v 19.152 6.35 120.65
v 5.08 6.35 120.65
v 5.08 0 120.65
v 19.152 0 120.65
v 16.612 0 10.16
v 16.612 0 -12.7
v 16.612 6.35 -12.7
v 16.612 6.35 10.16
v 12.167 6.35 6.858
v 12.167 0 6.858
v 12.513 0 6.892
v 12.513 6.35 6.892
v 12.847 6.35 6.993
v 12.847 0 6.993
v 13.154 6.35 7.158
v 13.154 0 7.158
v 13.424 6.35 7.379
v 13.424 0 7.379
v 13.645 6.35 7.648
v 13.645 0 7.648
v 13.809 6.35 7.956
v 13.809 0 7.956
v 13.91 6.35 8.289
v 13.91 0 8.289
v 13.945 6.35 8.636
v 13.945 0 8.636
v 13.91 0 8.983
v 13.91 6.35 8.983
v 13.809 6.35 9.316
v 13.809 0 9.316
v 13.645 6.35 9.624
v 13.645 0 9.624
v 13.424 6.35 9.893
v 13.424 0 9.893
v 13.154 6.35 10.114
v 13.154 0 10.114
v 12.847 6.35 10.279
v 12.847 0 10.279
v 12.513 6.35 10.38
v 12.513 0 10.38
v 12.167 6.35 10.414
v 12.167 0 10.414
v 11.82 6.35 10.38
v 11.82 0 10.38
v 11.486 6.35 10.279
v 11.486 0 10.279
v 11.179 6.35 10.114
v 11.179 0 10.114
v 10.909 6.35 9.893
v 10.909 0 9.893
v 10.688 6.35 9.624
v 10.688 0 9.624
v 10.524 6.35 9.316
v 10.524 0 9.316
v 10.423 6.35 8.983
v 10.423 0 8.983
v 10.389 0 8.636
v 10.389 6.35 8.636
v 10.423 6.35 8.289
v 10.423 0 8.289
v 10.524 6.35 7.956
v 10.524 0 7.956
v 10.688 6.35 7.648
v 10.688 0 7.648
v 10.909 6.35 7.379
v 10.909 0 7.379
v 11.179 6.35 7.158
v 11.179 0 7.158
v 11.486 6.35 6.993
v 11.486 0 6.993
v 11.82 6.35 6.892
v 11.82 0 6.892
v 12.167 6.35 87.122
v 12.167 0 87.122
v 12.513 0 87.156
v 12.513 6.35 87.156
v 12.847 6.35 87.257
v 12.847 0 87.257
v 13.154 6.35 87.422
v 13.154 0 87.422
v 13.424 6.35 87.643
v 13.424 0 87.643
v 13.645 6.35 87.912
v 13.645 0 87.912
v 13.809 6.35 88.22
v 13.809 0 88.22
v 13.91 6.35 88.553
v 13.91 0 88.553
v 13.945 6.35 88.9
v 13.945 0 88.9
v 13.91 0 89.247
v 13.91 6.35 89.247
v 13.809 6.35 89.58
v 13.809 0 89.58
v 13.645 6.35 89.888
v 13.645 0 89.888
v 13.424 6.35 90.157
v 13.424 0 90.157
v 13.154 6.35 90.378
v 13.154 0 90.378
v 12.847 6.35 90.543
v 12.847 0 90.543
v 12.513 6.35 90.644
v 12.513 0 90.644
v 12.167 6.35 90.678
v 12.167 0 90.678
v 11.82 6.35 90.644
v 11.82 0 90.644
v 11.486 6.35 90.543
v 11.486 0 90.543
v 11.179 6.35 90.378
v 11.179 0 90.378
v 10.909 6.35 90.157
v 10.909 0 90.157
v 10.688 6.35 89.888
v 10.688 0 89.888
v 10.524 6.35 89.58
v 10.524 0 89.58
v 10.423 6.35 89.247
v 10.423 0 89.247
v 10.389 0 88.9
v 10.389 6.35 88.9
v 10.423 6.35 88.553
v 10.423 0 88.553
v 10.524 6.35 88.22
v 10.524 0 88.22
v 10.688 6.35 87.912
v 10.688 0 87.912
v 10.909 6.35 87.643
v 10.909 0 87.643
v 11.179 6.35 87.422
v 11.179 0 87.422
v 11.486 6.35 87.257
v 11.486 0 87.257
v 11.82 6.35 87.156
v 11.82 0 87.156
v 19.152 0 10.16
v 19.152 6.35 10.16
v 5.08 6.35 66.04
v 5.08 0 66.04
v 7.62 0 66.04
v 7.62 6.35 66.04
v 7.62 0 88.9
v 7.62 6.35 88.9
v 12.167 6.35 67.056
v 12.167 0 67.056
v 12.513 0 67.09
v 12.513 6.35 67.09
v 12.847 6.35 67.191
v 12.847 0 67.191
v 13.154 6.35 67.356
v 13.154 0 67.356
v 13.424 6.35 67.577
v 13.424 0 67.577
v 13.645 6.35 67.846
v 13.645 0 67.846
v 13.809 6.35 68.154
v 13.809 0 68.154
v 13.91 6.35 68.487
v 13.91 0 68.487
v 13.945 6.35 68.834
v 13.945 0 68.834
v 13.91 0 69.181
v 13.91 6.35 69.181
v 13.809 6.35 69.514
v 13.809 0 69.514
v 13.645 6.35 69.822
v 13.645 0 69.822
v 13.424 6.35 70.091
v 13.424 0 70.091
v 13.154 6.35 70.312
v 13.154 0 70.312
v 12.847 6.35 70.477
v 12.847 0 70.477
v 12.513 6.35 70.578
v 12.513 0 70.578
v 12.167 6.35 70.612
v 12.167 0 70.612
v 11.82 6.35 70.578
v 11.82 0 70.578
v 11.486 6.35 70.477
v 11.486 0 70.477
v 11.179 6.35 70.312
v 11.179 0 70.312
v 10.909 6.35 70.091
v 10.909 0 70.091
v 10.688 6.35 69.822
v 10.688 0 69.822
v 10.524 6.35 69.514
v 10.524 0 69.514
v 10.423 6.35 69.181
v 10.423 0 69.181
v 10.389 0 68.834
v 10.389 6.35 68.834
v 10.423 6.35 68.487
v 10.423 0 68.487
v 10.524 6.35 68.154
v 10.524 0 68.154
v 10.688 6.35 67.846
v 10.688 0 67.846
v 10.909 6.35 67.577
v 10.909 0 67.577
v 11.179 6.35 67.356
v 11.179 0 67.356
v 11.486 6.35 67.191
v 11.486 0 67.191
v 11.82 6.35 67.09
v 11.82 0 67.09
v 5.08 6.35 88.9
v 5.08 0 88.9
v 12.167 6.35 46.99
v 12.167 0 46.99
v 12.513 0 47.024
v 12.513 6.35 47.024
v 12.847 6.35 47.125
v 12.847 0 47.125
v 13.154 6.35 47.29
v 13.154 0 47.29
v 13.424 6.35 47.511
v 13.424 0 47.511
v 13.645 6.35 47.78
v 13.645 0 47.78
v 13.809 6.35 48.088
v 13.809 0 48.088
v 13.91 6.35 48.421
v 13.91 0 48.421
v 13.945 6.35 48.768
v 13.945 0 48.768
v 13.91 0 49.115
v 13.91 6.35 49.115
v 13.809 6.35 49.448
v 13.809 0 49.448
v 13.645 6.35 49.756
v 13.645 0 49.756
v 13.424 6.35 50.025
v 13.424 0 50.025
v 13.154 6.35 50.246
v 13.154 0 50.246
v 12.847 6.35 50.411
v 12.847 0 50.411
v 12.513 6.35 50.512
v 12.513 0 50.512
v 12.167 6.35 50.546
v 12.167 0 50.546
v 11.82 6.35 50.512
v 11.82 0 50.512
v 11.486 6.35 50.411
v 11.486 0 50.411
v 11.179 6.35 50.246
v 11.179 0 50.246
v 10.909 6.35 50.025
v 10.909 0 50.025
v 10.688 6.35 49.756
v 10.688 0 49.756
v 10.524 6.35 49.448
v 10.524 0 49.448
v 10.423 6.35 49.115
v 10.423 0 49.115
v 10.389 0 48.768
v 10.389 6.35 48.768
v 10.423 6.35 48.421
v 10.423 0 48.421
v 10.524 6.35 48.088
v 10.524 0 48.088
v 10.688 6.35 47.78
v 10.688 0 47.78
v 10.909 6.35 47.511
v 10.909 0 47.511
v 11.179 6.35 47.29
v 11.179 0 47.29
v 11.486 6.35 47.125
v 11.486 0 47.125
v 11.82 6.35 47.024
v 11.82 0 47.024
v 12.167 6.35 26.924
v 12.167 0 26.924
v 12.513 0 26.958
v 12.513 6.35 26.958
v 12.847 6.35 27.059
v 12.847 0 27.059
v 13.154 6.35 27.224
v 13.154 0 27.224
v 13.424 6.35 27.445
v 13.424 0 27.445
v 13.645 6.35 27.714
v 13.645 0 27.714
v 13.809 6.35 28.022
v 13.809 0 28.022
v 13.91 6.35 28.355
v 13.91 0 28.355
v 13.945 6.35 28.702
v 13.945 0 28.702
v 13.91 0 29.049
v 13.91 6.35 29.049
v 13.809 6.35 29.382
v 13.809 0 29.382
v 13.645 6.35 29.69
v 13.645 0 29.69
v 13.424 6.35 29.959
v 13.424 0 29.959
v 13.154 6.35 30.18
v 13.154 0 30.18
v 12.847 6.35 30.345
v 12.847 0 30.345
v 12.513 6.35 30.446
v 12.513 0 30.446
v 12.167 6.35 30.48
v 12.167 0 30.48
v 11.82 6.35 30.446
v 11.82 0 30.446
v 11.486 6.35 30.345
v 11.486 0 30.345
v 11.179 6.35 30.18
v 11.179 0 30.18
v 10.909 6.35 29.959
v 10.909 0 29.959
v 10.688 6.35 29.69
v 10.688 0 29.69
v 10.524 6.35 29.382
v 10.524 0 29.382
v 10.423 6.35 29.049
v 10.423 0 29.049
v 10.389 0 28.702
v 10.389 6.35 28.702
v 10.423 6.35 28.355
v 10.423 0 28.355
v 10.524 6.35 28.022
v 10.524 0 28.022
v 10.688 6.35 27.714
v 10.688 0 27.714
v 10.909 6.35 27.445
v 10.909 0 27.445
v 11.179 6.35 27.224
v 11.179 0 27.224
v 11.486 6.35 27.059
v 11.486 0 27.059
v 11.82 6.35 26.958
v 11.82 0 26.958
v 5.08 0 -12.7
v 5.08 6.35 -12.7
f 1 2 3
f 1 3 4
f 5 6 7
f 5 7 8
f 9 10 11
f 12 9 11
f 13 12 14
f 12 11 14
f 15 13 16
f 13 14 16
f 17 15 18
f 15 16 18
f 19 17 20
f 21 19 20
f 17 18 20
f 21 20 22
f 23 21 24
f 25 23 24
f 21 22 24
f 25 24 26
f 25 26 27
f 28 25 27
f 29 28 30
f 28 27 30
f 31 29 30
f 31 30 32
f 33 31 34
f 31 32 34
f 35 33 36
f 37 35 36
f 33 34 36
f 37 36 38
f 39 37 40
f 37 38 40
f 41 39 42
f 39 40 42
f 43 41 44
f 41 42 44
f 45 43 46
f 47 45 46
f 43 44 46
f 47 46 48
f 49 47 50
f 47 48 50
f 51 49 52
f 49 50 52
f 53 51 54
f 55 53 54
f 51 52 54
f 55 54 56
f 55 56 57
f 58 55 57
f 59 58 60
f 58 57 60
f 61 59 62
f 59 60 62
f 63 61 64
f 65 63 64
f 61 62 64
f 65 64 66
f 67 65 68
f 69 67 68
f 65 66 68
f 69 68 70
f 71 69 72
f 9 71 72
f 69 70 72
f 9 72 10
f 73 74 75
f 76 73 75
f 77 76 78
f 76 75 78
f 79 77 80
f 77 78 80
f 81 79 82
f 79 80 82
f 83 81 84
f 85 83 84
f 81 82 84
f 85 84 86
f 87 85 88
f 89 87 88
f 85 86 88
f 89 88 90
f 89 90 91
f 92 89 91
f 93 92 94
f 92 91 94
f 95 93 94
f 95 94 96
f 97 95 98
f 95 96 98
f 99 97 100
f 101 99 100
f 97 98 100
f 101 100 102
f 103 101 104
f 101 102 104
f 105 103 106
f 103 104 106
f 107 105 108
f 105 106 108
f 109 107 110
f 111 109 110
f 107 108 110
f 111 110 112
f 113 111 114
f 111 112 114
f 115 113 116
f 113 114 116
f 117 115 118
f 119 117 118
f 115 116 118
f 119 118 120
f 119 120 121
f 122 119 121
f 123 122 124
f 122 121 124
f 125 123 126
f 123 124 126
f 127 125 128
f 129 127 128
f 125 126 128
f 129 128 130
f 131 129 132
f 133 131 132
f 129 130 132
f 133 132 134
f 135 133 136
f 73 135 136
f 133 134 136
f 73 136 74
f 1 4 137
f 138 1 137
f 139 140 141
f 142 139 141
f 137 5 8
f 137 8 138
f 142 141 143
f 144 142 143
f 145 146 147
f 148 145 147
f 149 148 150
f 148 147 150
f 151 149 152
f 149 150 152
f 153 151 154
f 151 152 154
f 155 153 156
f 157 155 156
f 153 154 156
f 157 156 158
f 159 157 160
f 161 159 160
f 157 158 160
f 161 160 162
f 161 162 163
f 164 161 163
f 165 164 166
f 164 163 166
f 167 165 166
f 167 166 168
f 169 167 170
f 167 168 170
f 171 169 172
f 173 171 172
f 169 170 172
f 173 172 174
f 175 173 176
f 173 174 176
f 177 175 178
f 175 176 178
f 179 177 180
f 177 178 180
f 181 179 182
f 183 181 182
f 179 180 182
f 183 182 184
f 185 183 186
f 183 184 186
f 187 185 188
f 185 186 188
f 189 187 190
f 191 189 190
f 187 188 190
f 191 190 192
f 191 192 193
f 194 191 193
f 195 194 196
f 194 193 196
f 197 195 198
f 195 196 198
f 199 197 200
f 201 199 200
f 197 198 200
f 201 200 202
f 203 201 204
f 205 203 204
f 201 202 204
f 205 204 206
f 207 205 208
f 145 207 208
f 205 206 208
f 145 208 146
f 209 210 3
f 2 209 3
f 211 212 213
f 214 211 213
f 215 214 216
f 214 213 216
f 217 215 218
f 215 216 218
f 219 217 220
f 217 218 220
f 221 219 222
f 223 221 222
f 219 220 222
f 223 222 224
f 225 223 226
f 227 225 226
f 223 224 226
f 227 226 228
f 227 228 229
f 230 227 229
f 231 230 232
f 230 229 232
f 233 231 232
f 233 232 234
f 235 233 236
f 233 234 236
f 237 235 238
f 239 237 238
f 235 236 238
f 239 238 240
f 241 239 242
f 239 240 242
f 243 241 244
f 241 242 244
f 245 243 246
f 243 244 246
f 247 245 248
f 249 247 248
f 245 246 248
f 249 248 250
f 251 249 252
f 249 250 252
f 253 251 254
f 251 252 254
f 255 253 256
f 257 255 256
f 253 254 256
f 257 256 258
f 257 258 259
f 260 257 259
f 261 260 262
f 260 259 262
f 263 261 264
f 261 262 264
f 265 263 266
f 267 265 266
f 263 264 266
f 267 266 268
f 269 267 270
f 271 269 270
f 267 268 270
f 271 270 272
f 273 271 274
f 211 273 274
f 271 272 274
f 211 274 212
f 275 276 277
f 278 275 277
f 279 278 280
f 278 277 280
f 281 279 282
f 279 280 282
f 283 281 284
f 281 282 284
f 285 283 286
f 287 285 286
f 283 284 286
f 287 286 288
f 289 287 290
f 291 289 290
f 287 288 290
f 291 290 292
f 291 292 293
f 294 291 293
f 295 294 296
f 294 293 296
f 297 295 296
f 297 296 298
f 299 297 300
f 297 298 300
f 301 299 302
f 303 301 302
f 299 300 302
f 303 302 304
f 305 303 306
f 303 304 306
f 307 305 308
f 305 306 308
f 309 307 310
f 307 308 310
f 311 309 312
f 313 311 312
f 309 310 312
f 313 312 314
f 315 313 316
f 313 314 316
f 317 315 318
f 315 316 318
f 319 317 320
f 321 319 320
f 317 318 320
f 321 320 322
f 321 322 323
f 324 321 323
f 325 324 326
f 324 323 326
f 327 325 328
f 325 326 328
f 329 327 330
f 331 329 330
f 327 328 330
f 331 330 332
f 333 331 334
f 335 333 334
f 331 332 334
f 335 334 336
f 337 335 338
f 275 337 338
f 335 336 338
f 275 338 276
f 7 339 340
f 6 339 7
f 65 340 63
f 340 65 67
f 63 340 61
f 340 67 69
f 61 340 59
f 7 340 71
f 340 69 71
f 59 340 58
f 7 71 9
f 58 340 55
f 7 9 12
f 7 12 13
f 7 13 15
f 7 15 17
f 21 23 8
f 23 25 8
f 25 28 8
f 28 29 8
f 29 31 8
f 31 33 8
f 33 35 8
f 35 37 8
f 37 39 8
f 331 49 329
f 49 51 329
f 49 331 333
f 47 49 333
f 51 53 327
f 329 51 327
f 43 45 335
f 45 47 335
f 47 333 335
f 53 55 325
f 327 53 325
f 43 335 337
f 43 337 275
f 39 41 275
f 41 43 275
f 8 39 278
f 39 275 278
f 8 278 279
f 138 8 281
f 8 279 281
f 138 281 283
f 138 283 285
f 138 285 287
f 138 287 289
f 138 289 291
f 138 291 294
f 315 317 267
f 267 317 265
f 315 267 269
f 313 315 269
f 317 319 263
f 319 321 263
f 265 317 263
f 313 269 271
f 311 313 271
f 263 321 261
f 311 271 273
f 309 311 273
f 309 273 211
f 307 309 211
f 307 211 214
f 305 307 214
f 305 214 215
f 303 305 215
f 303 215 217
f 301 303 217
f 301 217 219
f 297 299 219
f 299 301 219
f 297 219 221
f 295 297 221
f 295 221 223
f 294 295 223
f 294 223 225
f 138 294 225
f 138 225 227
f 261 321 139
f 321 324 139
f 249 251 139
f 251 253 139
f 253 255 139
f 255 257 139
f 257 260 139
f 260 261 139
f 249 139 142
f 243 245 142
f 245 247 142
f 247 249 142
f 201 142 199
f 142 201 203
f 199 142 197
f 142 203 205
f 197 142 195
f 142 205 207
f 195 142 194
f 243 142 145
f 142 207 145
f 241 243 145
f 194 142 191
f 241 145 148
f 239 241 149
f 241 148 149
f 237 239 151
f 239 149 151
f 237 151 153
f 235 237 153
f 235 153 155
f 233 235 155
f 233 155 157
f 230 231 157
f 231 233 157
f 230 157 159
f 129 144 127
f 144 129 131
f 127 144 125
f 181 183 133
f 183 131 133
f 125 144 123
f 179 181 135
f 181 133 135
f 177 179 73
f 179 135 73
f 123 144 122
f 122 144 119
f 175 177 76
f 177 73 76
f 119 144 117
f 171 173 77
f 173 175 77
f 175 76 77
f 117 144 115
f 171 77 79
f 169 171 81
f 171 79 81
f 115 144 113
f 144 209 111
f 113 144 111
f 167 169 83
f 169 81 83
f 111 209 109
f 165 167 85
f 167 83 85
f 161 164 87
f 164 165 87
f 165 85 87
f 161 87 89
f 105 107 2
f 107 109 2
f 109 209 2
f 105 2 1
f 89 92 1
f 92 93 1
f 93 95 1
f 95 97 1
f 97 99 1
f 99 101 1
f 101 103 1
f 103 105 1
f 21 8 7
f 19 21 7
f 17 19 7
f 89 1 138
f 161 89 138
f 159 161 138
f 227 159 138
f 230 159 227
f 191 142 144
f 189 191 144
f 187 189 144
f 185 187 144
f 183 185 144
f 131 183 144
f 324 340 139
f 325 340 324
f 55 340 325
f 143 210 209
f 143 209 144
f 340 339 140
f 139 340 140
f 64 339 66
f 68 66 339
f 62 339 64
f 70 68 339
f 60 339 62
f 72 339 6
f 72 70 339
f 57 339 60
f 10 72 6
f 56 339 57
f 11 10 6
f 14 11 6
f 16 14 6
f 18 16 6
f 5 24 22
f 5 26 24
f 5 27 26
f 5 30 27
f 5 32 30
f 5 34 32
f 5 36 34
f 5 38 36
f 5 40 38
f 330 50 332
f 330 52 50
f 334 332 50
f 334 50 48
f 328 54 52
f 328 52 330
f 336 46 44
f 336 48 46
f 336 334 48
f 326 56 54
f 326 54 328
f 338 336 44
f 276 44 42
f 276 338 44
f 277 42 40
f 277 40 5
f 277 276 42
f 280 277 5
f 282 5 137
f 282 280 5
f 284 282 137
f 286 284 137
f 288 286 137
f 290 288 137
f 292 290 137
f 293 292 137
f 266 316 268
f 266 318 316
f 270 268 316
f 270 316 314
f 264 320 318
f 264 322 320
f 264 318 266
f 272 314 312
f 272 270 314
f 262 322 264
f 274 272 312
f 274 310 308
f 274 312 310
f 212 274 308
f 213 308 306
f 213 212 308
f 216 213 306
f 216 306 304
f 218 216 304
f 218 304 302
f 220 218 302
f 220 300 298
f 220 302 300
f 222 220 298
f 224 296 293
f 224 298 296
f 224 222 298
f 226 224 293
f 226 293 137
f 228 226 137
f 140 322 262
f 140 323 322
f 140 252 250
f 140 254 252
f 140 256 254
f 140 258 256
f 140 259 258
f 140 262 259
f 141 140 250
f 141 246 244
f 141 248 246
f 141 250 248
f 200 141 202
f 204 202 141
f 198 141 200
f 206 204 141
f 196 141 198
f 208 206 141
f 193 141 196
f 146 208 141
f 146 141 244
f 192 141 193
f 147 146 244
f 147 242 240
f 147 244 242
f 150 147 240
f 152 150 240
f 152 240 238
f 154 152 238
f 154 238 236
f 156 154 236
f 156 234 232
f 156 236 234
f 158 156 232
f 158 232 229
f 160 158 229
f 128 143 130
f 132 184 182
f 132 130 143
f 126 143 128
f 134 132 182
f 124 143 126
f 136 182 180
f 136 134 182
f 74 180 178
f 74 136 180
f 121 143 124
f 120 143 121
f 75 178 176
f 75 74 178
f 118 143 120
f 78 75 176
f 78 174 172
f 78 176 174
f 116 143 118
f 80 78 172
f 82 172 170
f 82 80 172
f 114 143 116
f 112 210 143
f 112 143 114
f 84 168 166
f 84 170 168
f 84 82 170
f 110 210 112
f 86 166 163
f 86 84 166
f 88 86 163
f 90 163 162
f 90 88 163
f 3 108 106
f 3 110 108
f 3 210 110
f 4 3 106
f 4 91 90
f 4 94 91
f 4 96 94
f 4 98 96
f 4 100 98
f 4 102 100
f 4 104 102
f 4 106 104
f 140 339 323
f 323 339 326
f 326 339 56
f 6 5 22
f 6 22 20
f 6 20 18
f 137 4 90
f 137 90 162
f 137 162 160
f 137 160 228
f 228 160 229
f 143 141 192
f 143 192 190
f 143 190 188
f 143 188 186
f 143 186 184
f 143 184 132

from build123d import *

# Parameters (mm, degrees)
SKETCH1_W           = 69.85
SKETCH1_H           = 6.35
BOSS_EXTRUDE1_DEPTH = 120.65
CUT_EXTRUDE1_DEPTH  = 140.555607197
SKETCH3_W           = 5.08
SKETCH3_H           = 120.65
CUT_EXTRUDE2_DEPTH  = 42.164
SKETCH4_W           = 2.54
SKETCH4_H           = 22.86
CUT_EXTRUDE3_DEPTH  = 6.35
SKETCH5_W           = 11.5316
SKETCH5_H           = 12.7
BOSS_EXTRUDE2_DEPTH = 6.35
SKETCH6_R           = 1.778
CUT_EXTRUDE4_DEPTH  = 6.35


with BuildPart() as part:
    # Sketch1 → Boss-Extrude1 (new body)
    with BuildSketch(Plane.XY):
        with Locations((34.925, 3.175)):
            Rectangle(SKETCH1_W, SKETCH1_H)
    extrude(amount=BOSS_EXTRUDE1_DEPTH)

    # Sketch2 → Cut-Extrude1 (cut, through all)
    with BuildSketch(Plane(origin=(0, 6.35, 0), x_dir=(1, 0, 0), z_dir=(0, 1, 0))):
        Polygon((35.923749516, 0), (35.923749516, -37.802999389), (69.85, -55.962276793), (69.85, 0), align=None)
    extrude(amount=-CUT_EXTRUDE1_DEPTH, mode=Mode.SUBTRACT)

    # Sketch3 → Cut-Extrude2 (cut)
    with BuildSketch(Plane.XZ):
        Polygon((19.1516, 120.65), (19.1516, 0), (35.923749516, 0), (35.923749516, 37.802999389), (69.85, 55.962276793), (69.85, 120.65), align=None)
        with Locations((2.54, 60.325)):
            Rectangle(SKETCH3_W, SKETCH3_H)
    extrude(amount=-CUT_EXTRUDE2_DEPTH, mode=Mode.SUBTRACT)

    # Sketch4 → Cut-Extrude3 (cut)
    with BuildSketch(Plane.XZ):
        with Locations((6.35, 77.47)):
            Rectangle(SKETCH4_W, SKETCH4_H)
        with Locations((17.8816, -1.27)):
            Rectangle(SKETCH4_W, SKETCH4_H)
    extrude(amount=-CUT_EXTRUDE3_DEPTH, mode=Mode.SUBTRACT)

    # Sketch5 → Boss-Extrude2 (add)
    with BuildSketch(Plane.XZ):
        with Locations((10.8458, -6.35)):
            Rectangle(SKETCH5_W, SKETCH5_H)
    extrude(amount=-BOSS_EXTRUDE2_DEPTH)

    # Sketch6 → Cut-Extrude4 (cut)
    with BuildSketch(Plane.XZ):
        with Locations(Location((12.1666, 88.9, 0), (0, 0, 270))):
            Circle(SKETCH6_R)
        with Locations(Location((12.1666, 68.834, 0), (0, 0, 270))):
            Circle(SKETCH6_R)
        Circle(SKETCH6_R)
        with Locations(Location((12.1666, 48.768, 0), (0, 0, 270))):
            Circle(SKETCH6_R)
        with Locations(Location((12.1666, 28.702, 0), (0, 0, 270))):
            Circle(SKETCH6_R)
        with Locations(Location((12.1666, 8.636, 0), (0, 0, 270))):
            Circle(SKETCH6_R)
    extrude(amount=-CUT_EXTRUDE4_DEPTH, mode=Mode.SUBTRACT)


solid = part.part
